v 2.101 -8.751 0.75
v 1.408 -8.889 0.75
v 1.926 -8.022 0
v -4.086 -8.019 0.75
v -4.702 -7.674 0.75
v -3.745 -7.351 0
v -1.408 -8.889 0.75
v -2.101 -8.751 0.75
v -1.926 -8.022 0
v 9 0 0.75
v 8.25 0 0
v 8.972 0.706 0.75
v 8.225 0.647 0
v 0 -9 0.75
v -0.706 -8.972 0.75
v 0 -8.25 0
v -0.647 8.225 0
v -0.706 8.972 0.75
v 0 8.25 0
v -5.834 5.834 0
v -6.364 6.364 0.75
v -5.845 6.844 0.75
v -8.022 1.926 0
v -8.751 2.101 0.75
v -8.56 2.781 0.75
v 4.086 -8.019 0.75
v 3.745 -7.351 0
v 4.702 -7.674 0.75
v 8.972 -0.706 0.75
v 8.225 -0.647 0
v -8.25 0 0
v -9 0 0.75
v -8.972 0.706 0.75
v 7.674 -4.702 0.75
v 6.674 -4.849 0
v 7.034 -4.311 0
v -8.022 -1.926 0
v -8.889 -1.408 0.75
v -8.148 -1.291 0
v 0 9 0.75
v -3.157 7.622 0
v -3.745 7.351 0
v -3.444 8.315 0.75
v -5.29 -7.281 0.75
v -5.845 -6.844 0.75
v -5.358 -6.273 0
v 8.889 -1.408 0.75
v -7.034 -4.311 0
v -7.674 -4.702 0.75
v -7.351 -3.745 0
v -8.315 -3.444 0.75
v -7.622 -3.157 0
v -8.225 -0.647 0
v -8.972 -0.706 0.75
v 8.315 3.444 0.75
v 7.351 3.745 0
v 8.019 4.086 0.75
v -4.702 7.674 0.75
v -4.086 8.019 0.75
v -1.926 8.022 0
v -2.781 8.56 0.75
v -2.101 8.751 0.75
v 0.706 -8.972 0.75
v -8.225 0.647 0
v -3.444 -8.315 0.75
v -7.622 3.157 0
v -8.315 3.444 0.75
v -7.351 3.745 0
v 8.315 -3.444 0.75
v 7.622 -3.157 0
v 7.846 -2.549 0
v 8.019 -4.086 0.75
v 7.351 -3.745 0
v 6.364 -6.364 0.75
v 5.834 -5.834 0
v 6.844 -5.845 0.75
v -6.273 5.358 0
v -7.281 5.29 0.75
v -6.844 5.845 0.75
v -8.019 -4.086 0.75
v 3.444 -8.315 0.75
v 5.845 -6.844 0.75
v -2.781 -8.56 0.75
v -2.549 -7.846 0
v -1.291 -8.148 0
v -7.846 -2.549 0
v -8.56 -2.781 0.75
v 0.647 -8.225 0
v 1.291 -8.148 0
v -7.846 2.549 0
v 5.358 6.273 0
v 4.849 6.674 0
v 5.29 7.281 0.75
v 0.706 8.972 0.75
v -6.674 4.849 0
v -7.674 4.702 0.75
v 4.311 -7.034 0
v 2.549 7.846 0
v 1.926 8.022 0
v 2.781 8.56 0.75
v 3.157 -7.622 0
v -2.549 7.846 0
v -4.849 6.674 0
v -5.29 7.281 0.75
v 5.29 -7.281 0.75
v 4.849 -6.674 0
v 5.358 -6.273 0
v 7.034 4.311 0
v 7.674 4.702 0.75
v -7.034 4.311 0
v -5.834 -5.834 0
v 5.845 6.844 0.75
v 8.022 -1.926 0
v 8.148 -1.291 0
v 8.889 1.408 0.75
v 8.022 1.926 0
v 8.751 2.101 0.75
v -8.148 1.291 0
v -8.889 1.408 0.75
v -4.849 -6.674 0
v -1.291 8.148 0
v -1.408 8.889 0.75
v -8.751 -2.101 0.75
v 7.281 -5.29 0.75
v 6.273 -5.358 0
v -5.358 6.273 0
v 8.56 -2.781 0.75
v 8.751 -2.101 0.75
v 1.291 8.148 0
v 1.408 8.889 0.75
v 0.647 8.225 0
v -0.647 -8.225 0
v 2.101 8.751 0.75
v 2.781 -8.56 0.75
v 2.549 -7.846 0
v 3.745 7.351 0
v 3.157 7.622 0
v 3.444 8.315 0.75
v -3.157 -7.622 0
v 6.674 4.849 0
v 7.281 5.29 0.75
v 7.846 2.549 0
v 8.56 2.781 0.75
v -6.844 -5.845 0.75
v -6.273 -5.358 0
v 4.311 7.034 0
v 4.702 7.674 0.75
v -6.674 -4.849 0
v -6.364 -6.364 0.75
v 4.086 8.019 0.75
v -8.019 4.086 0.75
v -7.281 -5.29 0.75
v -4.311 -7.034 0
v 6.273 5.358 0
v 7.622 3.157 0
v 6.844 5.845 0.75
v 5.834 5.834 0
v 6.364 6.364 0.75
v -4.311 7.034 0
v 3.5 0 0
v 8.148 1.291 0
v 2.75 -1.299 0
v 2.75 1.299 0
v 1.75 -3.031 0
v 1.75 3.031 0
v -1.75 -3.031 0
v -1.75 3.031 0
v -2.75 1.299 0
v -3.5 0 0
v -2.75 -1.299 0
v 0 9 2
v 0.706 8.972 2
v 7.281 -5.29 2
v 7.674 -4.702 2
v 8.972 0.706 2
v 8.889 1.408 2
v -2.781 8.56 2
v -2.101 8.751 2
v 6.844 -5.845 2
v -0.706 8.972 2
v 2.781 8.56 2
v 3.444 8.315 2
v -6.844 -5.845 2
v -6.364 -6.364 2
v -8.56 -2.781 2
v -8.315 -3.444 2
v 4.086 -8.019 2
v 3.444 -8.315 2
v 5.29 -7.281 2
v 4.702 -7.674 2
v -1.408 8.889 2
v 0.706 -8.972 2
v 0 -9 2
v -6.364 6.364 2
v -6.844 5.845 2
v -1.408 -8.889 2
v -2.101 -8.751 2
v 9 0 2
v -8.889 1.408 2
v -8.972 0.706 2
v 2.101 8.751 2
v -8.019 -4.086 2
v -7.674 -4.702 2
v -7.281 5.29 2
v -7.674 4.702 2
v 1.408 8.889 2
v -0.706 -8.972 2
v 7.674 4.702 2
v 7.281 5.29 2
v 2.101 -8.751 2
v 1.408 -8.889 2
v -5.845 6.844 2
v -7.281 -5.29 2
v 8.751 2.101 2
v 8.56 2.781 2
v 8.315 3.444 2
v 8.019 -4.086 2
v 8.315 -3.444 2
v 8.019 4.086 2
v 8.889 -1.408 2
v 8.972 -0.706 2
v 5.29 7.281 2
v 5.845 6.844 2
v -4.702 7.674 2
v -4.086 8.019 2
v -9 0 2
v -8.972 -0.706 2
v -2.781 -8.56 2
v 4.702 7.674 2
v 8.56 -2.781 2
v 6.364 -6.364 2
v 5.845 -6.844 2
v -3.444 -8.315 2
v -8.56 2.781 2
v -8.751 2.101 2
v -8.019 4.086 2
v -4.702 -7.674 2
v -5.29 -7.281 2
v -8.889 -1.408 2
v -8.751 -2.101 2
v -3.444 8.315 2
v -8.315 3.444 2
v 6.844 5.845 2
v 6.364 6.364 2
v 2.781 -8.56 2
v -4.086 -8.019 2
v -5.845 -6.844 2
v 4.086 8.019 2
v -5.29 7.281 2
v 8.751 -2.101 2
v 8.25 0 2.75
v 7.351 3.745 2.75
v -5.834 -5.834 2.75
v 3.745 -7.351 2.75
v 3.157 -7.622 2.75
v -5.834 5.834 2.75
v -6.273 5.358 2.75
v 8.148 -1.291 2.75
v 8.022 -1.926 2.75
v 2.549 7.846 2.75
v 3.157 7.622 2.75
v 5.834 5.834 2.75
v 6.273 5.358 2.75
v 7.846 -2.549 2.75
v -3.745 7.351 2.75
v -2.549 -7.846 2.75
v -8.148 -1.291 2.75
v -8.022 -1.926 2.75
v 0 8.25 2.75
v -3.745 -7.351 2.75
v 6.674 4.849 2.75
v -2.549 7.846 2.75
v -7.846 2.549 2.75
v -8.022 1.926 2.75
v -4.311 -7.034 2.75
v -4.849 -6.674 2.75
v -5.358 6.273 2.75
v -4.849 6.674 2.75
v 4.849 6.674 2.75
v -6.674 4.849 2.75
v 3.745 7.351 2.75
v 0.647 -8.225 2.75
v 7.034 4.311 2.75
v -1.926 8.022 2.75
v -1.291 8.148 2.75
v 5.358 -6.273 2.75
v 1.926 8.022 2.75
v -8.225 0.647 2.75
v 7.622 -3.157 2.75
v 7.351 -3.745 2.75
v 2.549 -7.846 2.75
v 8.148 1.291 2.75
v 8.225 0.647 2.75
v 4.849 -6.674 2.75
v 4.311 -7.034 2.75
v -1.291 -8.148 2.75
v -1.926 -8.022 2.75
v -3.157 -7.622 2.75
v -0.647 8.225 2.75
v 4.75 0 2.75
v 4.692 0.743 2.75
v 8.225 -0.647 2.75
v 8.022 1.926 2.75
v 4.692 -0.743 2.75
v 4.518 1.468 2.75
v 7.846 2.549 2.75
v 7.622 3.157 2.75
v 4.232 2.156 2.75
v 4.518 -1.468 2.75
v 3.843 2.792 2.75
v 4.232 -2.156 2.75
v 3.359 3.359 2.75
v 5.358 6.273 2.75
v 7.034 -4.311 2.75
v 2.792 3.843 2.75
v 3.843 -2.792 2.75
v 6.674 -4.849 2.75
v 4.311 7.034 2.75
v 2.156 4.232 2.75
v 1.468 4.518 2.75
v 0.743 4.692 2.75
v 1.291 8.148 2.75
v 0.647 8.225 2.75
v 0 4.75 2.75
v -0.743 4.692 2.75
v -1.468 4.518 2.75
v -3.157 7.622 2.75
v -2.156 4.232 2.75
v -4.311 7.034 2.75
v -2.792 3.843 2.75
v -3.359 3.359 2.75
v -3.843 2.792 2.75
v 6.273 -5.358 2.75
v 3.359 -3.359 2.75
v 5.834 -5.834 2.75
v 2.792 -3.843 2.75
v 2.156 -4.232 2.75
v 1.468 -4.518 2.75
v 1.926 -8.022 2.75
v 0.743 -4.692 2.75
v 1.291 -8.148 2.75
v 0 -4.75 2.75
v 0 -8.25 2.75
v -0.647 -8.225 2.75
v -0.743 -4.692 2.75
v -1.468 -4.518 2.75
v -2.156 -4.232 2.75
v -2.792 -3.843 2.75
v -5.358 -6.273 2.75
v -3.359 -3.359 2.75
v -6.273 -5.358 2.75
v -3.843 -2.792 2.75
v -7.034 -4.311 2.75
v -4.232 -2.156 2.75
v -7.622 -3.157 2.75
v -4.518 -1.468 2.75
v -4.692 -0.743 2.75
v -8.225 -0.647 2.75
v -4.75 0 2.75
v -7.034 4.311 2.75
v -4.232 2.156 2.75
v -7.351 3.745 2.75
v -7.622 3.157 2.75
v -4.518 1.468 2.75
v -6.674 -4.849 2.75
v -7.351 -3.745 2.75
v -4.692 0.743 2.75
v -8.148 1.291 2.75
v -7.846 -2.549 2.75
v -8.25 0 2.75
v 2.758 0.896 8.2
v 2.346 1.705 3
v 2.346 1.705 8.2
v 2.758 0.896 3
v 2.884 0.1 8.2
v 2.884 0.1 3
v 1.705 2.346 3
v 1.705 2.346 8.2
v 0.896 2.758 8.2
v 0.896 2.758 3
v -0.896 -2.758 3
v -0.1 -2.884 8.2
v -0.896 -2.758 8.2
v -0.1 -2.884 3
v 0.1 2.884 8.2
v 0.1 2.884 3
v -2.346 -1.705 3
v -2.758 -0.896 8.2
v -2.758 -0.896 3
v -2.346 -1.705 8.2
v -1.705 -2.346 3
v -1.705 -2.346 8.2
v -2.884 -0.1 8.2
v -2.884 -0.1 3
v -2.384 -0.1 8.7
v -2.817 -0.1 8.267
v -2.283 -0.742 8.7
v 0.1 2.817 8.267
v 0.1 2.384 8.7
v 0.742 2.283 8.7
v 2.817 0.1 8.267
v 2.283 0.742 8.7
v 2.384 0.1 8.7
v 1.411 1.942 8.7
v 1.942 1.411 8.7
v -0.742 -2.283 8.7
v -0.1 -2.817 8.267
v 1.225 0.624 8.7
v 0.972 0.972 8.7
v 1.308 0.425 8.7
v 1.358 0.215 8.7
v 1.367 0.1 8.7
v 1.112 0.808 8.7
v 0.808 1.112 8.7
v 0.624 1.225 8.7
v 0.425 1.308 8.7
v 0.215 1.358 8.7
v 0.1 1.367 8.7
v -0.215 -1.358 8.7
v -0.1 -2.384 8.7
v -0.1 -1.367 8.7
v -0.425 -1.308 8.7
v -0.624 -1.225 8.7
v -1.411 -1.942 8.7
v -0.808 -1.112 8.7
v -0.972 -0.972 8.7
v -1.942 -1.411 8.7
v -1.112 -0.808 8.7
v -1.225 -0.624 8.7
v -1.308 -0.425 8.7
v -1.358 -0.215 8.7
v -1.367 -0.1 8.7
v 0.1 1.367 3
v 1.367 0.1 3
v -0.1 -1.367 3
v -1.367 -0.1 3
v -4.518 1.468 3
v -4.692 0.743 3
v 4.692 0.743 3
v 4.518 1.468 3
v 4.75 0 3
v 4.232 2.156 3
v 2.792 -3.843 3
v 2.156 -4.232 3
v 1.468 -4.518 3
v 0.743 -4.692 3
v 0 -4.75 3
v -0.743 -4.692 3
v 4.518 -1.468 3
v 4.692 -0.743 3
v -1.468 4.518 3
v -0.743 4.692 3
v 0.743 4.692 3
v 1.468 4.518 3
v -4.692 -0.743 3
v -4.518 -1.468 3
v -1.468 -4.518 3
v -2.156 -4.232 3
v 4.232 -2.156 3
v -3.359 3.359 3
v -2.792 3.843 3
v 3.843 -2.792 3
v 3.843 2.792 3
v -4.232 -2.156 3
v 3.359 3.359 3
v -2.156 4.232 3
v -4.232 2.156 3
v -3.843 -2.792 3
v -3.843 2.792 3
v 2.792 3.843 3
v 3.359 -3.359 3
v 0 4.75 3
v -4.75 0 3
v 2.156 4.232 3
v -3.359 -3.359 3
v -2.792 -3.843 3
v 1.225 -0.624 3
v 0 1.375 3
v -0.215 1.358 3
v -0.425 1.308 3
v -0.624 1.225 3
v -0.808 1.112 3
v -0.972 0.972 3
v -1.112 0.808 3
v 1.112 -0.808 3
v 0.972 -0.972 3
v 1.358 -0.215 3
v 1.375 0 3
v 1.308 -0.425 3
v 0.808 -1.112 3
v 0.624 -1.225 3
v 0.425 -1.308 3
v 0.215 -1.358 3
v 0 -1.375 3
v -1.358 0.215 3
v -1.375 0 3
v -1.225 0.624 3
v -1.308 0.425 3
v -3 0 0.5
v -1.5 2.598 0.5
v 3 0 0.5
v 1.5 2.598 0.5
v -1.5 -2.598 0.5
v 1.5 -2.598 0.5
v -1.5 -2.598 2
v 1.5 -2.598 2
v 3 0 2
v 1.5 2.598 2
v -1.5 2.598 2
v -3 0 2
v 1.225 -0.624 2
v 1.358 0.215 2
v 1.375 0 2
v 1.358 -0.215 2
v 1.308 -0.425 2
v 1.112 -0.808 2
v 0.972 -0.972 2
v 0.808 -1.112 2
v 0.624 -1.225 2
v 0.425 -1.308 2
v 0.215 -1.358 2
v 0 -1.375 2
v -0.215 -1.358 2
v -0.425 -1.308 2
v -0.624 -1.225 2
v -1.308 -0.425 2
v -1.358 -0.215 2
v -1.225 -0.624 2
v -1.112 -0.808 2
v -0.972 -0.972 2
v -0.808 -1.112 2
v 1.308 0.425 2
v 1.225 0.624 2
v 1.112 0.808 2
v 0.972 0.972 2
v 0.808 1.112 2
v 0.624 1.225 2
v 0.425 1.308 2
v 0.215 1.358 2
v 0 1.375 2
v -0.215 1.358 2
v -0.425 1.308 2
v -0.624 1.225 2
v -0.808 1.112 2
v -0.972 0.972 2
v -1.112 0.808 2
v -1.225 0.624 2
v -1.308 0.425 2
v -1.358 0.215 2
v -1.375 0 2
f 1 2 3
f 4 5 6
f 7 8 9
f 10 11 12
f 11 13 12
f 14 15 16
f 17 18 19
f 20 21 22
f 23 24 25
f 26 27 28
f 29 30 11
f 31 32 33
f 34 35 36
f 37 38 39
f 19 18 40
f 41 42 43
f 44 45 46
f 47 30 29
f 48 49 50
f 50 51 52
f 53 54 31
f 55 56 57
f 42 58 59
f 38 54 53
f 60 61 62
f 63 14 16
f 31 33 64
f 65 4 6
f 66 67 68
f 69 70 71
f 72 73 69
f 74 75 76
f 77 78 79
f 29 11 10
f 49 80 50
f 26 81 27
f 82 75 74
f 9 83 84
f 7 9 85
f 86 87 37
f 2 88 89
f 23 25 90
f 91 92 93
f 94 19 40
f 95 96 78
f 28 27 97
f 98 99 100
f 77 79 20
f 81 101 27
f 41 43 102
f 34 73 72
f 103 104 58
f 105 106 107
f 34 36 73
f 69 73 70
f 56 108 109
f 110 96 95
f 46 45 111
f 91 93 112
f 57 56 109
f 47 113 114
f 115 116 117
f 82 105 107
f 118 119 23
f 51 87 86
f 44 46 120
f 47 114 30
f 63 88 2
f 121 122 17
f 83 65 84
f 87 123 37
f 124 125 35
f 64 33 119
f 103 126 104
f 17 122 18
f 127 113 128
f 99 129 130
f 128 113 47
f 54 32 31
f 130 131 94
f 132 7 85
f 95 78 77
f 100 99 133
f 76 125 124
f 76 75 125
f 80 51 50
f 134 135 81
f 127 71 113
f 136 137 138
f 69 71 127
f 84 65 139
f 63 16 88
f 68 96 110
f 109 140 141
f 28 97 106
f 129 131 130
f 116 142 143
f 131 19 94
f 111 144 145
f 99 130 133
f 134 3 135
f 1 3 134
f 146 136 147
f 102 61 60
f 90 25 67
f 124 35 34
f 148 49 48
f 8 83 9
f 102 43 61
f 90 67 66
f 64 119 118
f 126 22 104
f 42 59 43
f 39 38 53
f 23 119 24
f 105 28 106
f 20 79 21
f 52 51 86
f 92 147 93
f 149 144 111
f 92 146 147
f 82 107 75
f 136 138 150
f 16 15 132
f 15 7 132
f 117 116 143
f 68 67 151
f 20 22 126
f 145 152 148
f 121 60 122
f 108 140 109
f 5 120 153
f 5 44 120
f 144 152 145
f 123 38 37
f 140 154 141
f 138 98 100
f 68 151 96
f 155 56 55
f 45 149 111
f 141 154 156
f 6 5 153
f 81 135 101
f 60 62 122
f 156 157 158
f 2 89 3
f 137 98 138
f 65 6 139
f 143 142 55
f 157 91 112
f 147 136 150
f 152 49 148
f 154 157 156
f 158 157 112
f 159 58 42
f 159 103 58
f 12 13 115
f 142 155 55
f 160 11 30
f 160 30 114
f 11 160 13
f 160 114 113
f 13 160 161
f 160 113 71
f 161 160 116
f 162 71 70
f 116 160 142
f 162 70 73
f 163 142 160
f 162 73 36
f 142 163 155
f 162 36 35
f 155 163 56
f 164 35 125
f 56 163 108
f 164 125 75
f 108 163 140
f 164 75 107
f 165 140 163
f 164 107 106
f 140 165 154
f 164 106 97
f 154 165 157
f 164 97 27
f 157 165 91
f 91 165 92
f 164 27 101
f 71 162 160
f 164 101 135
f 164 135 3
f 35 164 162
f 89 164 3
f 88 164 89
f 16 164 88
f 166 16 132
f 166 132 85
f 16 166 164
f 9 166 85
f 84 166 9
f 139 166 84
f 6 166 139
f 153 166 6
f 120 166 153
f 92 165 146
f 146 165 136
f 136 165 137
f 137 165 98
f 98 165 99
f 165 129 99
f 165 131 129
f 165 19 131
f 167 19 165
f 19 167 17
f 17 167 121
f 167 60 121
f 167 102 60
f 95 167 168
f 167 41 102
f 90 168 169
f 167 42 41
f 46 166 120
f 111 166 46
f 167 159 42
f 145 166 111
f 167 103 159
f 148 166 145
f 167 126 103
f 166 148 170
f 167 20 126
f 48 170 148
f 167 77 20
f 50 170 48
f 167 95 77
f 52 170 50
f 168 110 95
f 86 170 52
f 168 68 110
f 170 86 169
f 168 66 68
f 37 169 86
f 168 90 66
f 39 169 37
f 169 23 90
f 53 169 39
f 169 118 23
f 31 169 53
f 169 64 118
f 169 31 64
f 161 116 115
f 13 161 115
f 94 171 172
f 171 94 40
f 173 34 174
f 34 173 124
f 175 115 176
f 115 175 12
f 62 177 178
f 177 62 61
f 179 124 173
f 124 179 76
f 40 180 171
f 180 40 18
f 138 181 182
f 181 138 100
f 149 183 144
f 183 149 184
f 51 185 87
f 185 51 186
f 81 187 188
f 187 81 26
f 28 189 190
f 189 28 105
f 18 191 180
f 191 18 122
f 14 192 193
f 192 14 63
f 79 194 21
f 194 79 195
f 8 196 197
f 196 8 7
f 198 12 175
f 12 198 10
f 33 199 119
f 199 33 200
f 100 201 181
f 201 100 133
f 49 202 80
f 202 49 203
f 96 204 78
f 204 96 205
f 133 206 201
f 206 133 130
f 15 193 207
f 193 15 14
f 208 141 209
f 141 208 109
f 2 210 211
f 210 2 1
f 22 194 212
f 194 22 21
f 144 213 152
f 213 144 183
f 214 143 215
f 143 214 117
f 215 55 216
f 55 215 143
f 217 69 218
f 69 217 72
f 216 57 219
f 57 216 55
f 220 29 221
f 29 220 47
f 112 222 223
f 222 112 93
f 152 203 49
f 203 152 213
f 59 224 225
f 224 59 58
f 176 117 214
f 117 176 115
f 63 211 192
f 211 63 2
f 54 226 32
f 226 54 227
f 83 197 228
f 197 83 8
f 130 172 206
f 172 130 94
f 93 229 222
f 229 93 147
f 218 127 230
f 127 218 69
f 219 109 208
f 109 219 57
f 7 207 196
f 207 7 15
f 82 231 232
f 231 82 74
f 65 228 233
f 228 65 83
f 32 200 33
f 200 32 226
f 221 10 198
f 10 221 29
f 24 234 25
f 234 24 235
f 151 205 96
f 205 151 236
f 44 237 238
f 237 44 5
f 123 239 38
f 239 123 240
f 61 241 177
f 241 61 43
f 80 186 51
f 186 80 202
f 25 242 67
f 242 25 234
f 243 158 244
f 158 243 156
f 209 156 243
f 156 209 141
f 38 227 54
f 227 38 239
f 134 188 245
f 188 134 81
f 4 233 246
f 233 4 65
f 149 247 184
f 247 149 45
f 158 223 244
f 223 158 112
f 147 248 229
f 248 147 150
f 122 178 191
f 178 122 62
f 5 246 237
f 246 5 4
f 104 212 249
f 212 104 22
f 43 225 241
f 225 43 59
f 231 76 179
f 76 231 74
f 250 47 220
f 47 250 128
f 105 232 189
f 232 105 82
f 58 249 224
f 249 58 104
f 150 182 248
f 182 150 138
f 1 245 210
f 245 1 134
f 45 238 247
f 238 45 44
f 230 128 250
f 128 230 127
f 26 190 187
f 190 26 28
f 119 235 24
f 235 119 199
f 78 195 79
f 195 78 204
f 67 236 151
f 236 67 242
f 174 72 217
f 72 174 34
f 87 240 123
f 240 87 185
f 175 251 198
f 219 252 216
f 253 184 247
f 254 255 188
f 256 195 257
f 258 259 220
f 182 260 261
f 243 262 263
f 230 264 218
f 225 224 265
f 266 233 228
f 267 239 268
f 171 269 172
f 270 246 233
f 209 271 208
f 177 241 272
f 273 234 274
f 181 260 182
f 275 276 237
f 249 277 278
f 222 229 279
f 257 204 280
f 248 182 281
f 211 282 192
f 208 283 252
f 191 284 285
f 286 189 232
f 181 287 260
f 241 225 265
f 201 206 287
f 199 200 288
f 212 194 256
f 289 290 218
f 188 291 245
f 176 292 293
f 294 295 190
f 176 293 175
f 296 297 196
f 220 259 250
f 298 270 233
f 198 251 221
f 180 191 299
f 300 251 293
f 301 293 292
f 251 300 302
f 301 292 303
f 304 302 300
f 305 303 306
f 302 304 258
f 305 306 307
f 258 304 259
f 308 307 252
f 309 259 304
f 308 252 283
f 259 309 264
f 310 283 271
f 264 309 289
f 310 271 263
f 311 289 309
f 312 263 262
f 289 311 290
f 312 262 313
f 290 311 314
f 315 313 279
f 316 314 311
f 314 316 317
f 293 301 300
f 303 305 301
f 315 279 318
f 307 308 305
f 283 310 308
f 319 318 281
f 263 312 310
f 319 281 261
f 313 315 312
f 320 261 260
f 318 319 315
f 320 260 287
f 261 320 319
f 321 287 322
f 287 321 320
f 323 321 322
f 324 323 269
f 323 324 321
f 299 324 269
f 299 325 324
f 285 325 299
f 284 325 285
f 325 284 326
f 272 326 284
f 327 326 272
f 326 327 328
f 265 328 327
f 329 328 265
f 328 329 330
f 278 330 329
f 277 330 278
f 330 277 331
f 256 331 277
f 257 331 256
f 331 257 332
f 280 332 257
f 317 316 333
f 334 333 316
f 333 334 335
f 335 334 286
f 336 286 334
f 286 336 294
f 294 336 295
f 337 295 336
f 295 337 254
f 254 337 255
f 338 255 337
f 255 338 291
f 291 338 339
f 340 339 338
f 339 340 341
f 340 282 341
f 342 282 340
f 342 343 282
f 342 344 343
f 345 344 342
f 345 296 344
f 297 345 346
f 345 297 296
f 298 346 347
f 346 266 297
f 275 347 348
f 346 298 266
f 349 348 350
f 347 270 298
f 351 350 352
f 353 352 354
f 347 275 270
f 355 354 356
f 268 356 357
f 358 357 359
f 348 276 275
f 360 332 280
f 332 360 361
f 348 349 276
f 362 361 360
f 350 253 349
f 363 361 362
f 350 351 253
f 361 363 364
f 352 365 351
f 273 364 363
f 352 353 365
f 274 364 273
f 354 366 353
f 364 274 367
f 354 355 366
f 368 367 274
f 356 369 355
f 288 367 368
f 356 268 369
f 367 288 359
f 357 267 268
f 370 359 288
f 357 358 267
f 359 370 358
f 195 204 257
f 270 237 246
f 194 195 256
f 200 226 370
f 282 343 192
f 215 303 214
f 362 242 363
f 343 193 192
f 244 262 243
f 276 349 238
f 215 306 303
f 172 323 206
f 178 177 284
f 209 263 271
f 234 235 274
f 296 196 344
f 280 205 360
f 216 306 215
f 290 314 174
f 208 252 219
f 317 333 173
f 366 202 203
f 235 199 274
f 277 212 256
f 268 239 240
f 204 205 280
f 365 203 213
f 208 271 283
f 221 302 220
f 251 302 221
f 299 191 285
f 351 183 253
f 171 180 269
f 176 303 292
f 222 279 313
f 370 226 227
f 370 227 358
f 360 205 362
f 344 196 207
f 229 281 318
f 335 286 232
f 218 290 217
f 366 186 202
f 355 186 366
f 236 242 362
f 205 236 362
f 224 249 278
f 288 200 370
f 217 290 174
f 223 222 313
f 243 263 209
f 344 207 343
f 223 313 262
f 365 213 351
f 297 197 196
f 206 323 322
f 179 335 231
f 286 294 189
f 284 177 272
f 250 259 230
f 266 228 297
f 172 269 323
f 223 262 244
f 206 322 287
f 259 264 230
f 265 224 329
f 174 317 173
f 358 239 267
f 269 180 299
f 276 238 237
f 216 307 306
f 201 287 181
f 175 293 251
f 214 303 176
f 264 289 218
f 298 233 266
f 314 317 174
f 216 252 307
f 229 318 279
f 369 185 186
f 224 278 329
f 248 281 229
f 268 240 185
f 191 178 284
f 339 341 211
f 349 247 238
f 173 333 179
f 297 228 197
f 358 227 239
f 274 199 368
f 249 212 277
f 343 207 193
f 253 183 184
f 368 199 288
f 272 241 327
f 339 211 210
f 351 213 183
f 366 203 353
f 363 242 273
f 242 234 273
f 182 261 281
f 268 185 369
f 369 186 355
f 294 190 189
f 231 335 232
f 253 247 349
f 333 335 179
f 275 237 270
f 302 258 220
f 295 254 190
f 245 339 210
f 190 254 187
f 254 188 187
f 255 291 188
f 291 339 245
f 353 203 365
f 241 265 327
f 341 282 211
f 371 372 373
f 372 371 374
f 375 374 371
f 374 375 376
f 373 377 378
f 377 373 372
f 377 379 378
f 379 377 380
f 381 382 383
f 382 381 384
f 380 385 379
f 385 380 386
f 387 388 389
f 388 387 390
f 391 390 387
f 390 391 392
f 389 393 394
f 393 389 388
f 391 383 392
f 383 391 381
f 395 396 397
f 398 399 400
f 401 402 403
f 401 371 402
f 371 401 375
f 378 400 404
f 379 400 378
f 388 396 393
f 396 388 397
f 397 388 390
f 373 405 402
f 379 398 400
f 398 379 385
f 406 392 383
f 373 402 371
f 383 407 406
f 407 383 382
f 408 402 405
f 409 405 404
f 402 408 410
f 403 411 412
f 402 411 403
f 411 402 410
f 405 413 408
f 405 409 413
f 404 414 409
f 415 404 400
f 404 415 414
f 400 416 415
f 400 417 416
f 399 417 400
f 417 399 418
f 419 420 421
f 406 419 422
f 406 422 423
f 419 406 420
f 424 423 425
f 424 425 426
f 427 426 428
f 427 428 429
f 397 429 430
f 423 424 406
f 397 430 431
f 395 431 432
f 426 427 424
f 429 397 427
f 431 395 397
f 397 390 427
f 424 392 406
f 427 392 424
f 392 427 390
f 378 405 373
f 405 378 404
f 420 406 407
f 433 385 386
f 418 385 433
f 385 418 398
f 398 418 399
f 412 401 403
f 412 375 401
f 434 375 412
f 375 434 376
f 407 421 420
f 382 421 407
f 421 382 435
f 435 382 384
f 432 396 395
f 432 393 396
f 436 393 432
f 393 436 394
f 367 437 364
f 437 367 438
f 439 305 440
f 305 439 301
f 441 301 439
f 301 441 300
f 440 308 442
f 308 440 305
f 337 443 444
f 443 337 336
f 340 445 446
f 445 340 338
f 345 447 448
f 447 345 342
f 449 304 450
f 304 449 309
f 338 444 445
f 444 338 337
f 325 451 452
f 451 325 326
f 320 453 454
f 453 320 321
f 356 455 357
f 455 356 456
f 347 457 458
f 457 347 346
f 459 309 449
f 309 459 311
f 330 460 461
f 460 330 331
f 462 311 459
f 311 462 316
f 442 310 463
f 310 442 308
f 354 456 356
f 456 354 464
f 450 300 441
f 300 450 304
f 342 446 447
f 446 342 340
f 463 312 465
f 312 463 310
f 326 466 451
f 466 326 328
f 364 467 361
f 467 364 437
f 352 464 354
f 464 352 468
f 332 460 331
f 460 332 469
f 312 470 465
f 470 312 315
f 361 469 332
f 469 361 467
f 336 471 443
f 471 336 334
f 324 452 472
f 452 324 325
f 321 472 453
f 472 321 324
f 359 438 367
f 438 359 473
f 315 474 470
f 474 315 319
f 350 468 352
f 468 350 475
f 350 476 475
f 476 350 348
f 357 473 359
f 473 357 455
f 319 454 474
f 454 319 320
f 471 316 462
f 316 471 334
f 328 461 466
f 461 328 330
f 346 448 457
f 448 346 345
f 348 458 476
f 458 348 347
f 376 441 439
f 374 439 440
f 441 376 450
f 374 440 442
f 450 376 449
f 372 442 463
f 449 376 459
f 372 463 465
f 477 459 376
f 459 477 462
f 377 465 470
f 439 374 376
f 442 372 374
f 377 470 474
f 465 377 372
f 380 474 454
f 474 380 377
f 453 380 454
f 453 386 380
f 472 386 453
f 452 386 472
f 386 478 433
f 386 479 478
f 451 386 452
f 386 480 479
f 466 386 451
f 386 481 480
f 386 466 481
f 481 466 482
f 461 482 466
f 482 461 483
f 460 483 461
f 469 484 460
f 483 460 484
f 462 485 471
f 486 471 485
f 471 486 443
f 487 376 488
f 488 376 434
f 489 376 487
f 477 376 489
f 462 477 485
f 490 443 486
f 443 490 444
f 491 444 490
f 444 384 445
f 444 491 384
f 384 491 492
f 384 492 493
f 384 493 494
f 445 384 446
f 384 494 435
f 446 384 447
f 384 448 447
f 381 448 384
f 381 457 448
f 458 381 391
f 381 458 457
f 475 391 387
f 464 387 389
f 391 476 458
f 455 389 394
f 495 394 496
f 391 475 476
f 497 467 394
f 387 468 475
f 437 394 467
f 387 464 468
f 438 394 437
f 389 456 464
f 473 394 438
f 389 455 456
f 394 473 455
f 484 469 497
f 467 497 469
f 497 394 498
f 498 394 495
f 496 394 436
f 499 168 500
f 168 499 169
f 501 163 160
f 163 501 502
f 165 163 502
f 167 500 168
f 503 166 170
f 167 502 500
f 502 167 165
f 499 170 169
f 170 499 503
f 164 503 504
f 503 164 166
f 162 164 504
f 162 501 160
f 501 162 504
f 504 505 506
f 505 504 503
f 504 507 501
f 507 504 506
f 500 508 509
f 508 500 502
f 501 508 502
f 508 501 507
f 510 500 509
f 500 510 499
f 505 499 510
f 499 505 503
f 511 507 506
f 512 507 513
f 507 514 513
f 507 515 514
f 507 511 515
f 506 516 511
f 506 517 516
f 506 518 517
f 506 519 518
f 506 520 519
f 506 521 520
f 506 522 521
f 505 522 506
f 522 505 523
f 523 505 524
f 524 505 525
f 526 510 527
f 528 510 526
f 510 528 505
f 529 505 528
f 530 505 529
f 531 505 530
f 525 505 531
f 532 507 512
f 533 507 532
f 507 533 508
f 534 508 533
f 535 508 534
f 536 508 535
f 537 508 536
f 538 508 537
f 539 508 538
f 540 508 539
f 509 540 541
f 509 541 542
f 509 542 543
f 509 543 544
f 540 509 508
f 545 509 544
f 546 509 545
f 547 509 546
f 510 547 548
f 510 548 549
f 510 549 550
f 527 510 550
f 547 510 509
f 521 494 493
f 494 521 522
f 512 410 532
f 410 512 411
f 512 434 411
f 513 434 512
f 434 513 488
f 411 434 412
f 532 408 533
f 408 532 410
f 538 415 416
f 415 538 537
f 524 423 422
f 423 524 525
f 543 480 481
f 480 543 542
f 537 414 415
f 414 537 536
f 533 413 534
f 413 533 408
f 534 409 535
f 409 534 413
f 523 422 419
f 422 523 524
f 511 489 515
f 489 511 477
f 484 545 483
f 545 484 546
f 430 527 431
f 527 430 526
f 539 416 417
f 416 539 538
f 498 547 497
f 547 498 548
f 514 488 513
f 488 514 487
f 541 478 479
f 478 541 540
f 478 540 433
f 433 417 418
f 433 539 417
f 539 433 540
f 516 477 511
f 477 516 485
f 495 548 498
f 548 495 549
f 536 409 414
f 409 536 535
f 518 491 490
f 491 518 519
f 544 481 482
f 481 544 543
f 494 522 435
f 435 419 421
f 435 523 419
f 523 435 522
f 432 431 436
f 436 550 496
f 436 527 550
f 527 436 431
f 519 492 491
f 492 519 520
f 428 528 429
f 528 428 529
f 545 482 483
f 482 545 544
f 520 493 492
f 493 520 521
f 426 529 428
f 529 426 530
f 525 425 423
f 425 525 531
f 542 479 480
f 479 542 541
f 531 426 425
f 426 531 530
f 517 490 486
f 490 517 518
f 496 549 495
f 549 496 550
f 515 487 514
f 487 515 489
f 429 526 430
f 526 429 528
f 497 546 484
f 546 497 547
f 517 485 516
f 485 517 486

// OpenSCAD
backoff=0.1;
bevel=0.5;
baseheight=3;
countersink=2;
prongheight=5.7;

baseshaft = baseheight - countersink;

echo("Tip", 10 - 6 - 2 * baseshaft);

difference() {
    union() {
        cylinder(r=9.5/2, h=baseheight, $fn=40);
        bevelcylinder(r=18/2, h=baseheight - 0.25, bevel=0.75, $fn=80);
        prongs();
    }
    cylinder(r=2.75/2, h=20, center=true, $fn=40);
    translate([0,0,-bevel])
        botoutbevelcylinder(r=6/2, h=countersink + bevel, $fn=6, bevel=2*bevel);
}

module prongs() {
    intersection() {
        bevelcylinder(r=5.8/2, h = baseheight + prongheight, $fn=20);
        union() {
            translate([backoff,backoff,0]) cube([10,10,10]);
            translate([-10 - backoff,-10 - backoff,0]) cube([10,10,10]);
        }
    }
}

module bevelcylinder(r, h) {
    cylinder(h=bevel, r1=r-bevel, r2 = r);
    translate([0,0,bevel]) cylinder(h=h - 2*bevel, r=r);
    translate([0,0,h-bevel]) cylinder(h=bevel, r1=r, r2=r - bevel);
}

module botbevelcylinder(r, h) {
    cylinder(h=bevel, r1=r-bevel, r2 = r);
    translate([0,0,bevel]) cylinder(h=h - bevel, r=r);
    // translate([0,0,h-bevel]) cylinder(h=bevel, r1=r, r2=r - bevel);
}

module botoutbevelcylinder(r, h) {
    cylinder(h=bevel, r1=r+bevel, r2 = r);
    cylinder(h=h, r=r);
    // translate([0,0,h-bevel]) cylinder(h=bevel, r1=r, r2=r - bevel);
}
